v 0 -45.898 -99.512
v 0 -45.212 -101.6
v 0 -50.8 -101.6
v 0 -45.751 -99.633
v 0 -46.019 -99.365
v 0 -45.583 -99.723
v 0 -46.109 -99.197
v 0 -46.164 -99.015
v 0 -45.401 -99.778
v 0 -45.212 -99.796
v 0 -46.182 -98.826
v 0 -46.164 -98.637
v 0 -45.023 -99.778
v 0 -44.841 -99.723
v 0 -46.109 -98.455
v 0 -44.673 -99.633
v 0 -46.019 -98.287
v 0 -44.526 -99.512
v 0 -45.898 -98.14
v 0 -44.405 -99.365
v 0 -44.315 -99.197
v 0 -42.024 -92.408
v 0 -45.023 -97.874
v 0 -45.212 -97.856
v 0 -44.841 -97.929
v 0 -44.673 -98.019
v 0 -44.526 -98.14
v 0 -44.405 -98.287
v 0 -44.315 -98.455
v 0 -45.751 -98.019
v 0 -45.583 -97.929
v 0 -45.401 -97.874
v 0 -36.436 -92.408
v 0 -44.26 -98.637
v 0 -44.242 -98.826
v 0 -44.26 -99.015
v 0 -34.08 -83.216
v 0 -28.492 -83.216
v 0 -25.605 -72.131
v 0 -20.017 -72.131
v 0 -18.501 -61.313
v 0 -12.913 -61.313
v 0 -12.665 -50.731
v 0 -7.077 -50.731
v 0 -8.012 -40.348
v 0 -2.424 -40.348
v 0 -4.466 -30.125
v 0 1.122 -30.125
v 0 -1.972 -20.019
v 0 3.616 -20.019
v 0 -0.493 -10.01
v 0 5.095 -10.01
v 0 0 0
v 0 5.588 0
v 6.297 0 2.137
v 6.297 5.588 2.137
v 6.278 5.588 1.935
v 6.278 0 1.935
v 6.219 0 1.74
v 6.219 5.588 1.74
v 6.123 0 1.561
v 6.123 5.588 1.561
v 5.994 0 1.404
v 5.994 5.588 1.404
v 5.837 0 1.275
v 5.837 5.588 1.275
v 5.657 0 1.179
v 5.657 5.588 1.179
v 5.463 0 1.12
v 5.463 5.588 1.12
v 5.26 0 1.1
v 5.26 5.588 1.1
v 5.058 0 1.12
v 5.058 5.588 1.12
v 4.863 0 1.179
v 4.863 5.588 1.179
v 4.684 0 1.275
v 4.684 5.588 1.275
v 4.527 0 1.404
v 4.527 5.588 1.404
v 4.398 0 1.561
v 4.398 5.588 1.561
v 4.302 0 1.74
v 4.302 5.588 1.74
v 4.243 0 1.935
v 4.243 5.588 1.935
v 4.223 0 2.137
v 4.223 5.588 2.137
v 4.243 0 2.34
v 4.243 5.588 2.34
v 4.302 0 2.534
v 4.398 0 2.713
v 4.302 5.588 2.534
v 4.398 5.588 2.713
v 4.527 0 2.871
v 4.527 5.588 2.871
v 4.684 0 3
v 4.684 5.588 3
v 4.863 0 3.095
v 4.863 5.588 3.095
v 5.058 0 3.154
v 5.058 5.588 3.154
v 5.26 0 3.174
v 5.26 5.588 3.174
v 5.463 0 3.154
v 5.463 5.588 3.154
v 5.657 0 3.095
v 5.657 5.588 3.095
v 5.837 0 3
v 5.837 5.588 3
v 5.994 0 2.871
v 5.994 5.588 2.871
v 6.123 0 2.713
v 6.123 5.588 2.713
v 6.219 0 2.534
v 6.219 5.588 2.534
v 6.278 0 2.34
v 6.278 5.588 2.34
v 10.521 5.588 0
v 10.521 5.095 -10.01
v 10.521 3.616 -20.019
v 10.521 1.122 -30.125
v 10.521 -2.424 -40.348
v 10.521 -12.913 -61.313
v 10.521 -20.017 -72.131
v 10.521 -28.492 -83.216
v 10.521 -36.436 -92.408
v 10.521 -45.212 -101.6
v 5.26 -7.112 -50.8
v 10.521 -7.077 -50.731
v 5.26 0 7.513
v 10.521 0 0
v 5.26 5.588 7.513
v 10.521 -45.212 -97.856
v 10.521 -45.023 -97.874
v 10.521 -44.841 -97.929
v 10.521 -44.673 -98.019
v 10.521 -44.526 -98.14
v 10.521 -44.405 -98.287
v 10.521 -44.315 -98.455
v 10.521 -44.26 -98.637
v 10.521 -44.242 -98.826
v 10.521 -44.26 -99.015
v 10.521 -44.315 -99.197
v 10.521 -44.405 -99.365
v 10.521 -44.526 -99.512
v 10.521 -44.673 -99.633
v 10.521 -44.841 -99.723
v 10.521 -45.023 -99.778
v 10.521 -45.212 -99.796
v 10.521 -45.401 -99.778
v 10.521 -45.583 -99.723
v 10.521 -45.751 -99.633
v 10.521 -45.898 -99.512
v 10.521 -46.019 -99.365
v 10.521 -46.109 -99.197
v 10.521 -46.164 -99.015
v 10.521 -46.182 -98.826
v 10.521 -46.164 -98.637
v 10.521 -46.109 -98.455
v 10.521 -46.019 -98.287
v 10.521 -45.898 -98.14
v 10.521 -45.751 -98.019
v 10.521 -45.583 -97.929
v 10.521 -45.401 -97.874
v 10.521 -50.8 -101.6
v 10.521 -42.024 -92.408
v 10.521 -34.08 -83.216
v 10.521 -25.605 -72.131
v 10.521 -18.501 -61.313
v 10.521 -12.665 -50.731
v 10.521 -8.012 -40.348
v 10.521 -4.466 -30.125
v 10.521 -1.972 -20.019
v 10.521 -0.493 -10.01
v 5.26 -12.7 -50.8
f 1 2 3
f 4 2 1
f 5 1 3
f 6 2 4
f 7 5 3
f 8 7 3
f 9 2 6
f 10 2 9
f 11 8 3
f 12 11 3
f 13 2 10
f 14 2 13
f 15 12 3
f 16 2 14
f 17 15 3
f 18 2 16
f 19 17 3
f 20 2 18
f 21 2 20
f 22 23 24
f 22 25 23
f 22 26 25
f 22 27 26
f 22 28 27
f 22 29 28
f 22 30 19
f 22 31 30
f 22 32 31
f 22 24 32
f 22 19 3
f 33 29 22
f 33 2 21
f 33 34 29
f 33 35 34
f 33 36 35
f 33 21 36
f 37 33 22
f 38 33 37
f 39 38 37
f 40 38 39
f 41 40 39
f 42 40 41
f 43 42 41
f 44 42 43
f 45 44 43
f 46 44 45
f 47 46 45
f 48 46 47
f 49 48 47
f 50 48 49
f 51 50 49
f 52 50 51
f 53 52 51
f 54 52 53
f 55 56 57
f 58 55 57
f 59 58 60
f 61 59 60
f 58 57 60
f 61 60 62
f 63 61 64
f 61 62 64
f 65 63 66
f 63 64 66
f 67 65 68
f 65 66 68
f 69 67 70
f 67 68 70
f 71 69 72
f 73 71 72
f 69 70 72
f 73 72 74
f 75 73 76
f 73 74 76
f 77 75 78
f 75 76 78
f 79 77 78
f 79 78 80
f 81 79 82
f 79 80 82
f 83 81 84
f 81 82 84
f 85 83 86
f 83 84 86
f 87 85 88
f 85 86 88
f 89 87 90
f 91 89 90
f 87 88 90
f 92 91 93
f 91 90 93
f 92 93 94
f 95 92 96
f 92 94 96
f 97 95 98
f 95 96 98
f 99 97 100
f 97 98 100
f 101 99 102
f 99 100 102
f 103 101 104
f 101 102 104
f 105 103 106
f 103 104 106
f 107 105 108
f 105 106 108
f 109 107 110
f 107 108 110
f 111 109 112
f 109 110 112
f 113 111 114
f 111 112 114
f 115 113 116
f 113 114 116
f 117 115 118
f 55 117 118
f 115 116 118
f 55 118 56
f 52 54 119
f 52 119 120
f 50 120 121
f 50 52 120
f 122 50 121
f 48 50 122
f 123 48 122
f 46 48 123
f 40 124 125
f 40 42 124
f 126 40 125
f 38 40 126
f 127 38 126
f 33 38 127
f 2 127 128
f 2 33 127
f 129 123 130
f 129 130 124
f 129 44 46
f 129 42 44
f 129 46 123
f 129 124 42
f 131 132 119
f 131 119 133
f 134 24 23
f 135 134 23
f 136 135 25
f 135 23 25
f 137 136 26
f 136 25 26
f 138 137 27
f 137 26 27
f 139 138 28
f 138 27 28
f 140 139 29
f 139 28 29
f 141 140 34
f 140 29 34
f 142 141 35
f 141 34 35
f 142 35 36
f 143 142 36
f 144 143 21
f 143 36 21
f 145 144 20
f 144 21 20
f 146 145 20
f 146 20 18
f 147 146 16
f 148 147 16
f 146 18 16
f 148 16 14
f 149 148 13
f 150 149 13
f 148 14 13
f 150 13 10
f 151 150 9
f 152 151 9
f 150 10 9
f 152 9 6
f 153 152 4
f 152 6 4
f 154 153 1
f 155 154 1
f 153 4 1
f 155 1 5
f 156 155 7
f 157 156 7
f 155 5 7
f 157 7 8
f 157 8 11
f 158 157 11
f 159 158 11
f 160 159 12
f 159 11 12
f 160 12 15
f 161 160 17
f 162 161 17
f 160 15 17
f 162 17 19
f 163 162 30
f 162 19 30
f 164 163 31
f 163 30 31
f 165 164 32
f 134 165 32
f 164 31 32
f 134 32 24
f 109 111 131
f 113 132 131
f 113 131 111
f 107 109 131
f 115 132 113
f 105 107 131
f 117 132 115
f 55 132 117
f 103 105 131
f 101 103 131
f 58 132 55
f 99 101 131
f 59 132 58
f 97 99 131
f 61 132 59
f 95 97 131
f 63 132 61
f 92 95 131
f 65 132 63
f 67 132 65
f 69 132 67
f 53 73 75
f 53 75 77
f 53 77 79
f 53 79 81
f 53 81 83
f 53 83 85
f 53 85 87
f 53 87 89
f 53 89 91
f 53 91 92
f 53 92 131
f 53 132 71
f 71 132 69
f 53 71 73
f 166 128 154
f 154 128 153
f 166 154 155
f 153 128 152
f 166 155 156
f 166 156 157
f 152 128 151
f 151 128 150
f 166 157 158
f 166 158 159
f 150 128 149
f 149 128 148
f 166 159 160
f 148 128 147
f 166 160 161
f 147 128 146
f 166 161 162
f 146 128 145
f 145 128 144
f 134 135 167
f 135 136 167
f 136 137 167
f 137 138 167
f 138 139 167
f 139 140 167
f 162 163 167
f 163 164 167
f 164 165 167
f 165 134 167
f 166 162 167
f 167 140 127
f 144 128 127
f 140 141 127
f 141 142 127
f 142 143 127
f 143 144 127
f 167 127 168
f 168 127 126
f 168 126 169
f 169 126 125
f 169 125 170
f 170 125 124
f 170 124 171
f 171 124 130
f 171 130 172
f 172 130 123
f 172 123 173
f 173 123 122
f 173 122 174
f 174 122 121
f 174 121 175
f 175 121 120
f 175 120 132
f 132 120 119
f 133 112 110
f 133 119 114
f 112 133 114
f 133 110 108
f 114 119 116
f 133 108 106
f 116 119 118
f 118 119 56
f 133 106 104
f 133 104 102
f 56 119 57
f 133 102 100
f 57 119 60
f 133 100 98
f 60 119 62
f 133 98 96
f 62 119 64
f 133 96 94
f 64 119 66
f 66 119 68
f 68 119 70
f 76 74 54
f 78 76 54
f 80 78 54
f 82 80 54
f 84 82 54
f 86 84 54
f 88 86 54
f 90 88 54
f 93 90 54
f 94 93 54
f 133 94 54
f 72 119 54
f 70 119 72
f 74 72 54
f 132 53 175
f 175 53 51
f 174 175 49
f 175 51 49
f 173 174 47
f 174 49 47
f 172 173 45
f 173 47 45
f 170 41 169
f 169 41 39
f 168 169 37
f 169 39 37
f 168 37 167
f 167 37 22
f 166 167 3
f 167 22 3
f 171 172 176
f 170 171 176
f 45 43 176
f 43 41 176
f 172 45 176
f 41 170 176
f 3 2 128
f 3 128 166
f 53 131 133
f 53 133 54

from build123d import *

# Parameters (mm, degrees)
BOSS_EXTRUDE1_DEPTH = 10.52068
BOSS_EXTRUDE3_DEPTH = 5.588
SKETCH4_R           = 1.037113256
CUT_EXTRUDE1_DEPTH  = 5.588
SKETCH5_R           = 0.970454713
CUT_EXTRUDE2_DEPTH  = 10.52068


with BuildPart() as part:
    # Sketch1 → Boss-Extrude1 (new body)
    with BuildSketch(Plane(origin=(0, 0, 0), x_dir=(0, 0, -1), z_dir=(1, 0, 0))):
        with BuildLine():
            Line((0, 0), (0, 5.588000005))
            add(Edge.make_bspline(
                [(0, 5.588000005), (50.799999991, 5.588000023), (101.6, -45.211999941)],
                knots=[0.084768036, 0.084768036, 0.084768036, 0.932448396, 0.932448396, 0.932448396], degree=2))
            Line((101.6, -45.211999941), (101.6, -50.799999941))
            add(Edge.make_bspline(
                [(0, 0), (50.79999999, 2e-08), (101.6, -50.799999941)],
                knots=[0.084768036, 0.084768036, 0.084768036, 0.932448396, 0.932448396, 0.932448396], degree=2))
        make_face()
    extrude(amount=BOSS_EXTRUDE1_DEPTH)

    # Sketch2 → Boss-Extrude3 (add)
    with BuildSketch(Plane(origin=(0, 0, 0), x_dir=(1, 0, 0), z_dir=(0, 1, 0))):
        Polygon((0, 0), (10.52068, 0), (5.26034, -7.512544086), align=None)
    extrude(amount=BOSS_EXTRUDE3_DEPTH)

    # Sketch4 → Cut-Extrude1 (cut)
    with BuildSketch(Plane(origin=(0, 5.588000005, 0), x_dir=(1, 0, 0), z_dir=(0, 1, 0))):
        with Locations((5.26034, -2.137251975)):
            Circle(SKETCH4_R)
    extrude(amount=-CUT_EXTRUDE1_DEPTH, mode=Mode.SUBTRACT)

    # Sketch5 → Cut-Extrude2 (cut)
    with BuildSketch(Plane.ZY):
        with Locations((-98.825997746, -45.21199994)):
            Circle(SKETCH5_R)
    extrude(amount=-CUT_EXTRUDE2_DEPTH, mode=Mode.SUBTRACT)


solid = part.part
